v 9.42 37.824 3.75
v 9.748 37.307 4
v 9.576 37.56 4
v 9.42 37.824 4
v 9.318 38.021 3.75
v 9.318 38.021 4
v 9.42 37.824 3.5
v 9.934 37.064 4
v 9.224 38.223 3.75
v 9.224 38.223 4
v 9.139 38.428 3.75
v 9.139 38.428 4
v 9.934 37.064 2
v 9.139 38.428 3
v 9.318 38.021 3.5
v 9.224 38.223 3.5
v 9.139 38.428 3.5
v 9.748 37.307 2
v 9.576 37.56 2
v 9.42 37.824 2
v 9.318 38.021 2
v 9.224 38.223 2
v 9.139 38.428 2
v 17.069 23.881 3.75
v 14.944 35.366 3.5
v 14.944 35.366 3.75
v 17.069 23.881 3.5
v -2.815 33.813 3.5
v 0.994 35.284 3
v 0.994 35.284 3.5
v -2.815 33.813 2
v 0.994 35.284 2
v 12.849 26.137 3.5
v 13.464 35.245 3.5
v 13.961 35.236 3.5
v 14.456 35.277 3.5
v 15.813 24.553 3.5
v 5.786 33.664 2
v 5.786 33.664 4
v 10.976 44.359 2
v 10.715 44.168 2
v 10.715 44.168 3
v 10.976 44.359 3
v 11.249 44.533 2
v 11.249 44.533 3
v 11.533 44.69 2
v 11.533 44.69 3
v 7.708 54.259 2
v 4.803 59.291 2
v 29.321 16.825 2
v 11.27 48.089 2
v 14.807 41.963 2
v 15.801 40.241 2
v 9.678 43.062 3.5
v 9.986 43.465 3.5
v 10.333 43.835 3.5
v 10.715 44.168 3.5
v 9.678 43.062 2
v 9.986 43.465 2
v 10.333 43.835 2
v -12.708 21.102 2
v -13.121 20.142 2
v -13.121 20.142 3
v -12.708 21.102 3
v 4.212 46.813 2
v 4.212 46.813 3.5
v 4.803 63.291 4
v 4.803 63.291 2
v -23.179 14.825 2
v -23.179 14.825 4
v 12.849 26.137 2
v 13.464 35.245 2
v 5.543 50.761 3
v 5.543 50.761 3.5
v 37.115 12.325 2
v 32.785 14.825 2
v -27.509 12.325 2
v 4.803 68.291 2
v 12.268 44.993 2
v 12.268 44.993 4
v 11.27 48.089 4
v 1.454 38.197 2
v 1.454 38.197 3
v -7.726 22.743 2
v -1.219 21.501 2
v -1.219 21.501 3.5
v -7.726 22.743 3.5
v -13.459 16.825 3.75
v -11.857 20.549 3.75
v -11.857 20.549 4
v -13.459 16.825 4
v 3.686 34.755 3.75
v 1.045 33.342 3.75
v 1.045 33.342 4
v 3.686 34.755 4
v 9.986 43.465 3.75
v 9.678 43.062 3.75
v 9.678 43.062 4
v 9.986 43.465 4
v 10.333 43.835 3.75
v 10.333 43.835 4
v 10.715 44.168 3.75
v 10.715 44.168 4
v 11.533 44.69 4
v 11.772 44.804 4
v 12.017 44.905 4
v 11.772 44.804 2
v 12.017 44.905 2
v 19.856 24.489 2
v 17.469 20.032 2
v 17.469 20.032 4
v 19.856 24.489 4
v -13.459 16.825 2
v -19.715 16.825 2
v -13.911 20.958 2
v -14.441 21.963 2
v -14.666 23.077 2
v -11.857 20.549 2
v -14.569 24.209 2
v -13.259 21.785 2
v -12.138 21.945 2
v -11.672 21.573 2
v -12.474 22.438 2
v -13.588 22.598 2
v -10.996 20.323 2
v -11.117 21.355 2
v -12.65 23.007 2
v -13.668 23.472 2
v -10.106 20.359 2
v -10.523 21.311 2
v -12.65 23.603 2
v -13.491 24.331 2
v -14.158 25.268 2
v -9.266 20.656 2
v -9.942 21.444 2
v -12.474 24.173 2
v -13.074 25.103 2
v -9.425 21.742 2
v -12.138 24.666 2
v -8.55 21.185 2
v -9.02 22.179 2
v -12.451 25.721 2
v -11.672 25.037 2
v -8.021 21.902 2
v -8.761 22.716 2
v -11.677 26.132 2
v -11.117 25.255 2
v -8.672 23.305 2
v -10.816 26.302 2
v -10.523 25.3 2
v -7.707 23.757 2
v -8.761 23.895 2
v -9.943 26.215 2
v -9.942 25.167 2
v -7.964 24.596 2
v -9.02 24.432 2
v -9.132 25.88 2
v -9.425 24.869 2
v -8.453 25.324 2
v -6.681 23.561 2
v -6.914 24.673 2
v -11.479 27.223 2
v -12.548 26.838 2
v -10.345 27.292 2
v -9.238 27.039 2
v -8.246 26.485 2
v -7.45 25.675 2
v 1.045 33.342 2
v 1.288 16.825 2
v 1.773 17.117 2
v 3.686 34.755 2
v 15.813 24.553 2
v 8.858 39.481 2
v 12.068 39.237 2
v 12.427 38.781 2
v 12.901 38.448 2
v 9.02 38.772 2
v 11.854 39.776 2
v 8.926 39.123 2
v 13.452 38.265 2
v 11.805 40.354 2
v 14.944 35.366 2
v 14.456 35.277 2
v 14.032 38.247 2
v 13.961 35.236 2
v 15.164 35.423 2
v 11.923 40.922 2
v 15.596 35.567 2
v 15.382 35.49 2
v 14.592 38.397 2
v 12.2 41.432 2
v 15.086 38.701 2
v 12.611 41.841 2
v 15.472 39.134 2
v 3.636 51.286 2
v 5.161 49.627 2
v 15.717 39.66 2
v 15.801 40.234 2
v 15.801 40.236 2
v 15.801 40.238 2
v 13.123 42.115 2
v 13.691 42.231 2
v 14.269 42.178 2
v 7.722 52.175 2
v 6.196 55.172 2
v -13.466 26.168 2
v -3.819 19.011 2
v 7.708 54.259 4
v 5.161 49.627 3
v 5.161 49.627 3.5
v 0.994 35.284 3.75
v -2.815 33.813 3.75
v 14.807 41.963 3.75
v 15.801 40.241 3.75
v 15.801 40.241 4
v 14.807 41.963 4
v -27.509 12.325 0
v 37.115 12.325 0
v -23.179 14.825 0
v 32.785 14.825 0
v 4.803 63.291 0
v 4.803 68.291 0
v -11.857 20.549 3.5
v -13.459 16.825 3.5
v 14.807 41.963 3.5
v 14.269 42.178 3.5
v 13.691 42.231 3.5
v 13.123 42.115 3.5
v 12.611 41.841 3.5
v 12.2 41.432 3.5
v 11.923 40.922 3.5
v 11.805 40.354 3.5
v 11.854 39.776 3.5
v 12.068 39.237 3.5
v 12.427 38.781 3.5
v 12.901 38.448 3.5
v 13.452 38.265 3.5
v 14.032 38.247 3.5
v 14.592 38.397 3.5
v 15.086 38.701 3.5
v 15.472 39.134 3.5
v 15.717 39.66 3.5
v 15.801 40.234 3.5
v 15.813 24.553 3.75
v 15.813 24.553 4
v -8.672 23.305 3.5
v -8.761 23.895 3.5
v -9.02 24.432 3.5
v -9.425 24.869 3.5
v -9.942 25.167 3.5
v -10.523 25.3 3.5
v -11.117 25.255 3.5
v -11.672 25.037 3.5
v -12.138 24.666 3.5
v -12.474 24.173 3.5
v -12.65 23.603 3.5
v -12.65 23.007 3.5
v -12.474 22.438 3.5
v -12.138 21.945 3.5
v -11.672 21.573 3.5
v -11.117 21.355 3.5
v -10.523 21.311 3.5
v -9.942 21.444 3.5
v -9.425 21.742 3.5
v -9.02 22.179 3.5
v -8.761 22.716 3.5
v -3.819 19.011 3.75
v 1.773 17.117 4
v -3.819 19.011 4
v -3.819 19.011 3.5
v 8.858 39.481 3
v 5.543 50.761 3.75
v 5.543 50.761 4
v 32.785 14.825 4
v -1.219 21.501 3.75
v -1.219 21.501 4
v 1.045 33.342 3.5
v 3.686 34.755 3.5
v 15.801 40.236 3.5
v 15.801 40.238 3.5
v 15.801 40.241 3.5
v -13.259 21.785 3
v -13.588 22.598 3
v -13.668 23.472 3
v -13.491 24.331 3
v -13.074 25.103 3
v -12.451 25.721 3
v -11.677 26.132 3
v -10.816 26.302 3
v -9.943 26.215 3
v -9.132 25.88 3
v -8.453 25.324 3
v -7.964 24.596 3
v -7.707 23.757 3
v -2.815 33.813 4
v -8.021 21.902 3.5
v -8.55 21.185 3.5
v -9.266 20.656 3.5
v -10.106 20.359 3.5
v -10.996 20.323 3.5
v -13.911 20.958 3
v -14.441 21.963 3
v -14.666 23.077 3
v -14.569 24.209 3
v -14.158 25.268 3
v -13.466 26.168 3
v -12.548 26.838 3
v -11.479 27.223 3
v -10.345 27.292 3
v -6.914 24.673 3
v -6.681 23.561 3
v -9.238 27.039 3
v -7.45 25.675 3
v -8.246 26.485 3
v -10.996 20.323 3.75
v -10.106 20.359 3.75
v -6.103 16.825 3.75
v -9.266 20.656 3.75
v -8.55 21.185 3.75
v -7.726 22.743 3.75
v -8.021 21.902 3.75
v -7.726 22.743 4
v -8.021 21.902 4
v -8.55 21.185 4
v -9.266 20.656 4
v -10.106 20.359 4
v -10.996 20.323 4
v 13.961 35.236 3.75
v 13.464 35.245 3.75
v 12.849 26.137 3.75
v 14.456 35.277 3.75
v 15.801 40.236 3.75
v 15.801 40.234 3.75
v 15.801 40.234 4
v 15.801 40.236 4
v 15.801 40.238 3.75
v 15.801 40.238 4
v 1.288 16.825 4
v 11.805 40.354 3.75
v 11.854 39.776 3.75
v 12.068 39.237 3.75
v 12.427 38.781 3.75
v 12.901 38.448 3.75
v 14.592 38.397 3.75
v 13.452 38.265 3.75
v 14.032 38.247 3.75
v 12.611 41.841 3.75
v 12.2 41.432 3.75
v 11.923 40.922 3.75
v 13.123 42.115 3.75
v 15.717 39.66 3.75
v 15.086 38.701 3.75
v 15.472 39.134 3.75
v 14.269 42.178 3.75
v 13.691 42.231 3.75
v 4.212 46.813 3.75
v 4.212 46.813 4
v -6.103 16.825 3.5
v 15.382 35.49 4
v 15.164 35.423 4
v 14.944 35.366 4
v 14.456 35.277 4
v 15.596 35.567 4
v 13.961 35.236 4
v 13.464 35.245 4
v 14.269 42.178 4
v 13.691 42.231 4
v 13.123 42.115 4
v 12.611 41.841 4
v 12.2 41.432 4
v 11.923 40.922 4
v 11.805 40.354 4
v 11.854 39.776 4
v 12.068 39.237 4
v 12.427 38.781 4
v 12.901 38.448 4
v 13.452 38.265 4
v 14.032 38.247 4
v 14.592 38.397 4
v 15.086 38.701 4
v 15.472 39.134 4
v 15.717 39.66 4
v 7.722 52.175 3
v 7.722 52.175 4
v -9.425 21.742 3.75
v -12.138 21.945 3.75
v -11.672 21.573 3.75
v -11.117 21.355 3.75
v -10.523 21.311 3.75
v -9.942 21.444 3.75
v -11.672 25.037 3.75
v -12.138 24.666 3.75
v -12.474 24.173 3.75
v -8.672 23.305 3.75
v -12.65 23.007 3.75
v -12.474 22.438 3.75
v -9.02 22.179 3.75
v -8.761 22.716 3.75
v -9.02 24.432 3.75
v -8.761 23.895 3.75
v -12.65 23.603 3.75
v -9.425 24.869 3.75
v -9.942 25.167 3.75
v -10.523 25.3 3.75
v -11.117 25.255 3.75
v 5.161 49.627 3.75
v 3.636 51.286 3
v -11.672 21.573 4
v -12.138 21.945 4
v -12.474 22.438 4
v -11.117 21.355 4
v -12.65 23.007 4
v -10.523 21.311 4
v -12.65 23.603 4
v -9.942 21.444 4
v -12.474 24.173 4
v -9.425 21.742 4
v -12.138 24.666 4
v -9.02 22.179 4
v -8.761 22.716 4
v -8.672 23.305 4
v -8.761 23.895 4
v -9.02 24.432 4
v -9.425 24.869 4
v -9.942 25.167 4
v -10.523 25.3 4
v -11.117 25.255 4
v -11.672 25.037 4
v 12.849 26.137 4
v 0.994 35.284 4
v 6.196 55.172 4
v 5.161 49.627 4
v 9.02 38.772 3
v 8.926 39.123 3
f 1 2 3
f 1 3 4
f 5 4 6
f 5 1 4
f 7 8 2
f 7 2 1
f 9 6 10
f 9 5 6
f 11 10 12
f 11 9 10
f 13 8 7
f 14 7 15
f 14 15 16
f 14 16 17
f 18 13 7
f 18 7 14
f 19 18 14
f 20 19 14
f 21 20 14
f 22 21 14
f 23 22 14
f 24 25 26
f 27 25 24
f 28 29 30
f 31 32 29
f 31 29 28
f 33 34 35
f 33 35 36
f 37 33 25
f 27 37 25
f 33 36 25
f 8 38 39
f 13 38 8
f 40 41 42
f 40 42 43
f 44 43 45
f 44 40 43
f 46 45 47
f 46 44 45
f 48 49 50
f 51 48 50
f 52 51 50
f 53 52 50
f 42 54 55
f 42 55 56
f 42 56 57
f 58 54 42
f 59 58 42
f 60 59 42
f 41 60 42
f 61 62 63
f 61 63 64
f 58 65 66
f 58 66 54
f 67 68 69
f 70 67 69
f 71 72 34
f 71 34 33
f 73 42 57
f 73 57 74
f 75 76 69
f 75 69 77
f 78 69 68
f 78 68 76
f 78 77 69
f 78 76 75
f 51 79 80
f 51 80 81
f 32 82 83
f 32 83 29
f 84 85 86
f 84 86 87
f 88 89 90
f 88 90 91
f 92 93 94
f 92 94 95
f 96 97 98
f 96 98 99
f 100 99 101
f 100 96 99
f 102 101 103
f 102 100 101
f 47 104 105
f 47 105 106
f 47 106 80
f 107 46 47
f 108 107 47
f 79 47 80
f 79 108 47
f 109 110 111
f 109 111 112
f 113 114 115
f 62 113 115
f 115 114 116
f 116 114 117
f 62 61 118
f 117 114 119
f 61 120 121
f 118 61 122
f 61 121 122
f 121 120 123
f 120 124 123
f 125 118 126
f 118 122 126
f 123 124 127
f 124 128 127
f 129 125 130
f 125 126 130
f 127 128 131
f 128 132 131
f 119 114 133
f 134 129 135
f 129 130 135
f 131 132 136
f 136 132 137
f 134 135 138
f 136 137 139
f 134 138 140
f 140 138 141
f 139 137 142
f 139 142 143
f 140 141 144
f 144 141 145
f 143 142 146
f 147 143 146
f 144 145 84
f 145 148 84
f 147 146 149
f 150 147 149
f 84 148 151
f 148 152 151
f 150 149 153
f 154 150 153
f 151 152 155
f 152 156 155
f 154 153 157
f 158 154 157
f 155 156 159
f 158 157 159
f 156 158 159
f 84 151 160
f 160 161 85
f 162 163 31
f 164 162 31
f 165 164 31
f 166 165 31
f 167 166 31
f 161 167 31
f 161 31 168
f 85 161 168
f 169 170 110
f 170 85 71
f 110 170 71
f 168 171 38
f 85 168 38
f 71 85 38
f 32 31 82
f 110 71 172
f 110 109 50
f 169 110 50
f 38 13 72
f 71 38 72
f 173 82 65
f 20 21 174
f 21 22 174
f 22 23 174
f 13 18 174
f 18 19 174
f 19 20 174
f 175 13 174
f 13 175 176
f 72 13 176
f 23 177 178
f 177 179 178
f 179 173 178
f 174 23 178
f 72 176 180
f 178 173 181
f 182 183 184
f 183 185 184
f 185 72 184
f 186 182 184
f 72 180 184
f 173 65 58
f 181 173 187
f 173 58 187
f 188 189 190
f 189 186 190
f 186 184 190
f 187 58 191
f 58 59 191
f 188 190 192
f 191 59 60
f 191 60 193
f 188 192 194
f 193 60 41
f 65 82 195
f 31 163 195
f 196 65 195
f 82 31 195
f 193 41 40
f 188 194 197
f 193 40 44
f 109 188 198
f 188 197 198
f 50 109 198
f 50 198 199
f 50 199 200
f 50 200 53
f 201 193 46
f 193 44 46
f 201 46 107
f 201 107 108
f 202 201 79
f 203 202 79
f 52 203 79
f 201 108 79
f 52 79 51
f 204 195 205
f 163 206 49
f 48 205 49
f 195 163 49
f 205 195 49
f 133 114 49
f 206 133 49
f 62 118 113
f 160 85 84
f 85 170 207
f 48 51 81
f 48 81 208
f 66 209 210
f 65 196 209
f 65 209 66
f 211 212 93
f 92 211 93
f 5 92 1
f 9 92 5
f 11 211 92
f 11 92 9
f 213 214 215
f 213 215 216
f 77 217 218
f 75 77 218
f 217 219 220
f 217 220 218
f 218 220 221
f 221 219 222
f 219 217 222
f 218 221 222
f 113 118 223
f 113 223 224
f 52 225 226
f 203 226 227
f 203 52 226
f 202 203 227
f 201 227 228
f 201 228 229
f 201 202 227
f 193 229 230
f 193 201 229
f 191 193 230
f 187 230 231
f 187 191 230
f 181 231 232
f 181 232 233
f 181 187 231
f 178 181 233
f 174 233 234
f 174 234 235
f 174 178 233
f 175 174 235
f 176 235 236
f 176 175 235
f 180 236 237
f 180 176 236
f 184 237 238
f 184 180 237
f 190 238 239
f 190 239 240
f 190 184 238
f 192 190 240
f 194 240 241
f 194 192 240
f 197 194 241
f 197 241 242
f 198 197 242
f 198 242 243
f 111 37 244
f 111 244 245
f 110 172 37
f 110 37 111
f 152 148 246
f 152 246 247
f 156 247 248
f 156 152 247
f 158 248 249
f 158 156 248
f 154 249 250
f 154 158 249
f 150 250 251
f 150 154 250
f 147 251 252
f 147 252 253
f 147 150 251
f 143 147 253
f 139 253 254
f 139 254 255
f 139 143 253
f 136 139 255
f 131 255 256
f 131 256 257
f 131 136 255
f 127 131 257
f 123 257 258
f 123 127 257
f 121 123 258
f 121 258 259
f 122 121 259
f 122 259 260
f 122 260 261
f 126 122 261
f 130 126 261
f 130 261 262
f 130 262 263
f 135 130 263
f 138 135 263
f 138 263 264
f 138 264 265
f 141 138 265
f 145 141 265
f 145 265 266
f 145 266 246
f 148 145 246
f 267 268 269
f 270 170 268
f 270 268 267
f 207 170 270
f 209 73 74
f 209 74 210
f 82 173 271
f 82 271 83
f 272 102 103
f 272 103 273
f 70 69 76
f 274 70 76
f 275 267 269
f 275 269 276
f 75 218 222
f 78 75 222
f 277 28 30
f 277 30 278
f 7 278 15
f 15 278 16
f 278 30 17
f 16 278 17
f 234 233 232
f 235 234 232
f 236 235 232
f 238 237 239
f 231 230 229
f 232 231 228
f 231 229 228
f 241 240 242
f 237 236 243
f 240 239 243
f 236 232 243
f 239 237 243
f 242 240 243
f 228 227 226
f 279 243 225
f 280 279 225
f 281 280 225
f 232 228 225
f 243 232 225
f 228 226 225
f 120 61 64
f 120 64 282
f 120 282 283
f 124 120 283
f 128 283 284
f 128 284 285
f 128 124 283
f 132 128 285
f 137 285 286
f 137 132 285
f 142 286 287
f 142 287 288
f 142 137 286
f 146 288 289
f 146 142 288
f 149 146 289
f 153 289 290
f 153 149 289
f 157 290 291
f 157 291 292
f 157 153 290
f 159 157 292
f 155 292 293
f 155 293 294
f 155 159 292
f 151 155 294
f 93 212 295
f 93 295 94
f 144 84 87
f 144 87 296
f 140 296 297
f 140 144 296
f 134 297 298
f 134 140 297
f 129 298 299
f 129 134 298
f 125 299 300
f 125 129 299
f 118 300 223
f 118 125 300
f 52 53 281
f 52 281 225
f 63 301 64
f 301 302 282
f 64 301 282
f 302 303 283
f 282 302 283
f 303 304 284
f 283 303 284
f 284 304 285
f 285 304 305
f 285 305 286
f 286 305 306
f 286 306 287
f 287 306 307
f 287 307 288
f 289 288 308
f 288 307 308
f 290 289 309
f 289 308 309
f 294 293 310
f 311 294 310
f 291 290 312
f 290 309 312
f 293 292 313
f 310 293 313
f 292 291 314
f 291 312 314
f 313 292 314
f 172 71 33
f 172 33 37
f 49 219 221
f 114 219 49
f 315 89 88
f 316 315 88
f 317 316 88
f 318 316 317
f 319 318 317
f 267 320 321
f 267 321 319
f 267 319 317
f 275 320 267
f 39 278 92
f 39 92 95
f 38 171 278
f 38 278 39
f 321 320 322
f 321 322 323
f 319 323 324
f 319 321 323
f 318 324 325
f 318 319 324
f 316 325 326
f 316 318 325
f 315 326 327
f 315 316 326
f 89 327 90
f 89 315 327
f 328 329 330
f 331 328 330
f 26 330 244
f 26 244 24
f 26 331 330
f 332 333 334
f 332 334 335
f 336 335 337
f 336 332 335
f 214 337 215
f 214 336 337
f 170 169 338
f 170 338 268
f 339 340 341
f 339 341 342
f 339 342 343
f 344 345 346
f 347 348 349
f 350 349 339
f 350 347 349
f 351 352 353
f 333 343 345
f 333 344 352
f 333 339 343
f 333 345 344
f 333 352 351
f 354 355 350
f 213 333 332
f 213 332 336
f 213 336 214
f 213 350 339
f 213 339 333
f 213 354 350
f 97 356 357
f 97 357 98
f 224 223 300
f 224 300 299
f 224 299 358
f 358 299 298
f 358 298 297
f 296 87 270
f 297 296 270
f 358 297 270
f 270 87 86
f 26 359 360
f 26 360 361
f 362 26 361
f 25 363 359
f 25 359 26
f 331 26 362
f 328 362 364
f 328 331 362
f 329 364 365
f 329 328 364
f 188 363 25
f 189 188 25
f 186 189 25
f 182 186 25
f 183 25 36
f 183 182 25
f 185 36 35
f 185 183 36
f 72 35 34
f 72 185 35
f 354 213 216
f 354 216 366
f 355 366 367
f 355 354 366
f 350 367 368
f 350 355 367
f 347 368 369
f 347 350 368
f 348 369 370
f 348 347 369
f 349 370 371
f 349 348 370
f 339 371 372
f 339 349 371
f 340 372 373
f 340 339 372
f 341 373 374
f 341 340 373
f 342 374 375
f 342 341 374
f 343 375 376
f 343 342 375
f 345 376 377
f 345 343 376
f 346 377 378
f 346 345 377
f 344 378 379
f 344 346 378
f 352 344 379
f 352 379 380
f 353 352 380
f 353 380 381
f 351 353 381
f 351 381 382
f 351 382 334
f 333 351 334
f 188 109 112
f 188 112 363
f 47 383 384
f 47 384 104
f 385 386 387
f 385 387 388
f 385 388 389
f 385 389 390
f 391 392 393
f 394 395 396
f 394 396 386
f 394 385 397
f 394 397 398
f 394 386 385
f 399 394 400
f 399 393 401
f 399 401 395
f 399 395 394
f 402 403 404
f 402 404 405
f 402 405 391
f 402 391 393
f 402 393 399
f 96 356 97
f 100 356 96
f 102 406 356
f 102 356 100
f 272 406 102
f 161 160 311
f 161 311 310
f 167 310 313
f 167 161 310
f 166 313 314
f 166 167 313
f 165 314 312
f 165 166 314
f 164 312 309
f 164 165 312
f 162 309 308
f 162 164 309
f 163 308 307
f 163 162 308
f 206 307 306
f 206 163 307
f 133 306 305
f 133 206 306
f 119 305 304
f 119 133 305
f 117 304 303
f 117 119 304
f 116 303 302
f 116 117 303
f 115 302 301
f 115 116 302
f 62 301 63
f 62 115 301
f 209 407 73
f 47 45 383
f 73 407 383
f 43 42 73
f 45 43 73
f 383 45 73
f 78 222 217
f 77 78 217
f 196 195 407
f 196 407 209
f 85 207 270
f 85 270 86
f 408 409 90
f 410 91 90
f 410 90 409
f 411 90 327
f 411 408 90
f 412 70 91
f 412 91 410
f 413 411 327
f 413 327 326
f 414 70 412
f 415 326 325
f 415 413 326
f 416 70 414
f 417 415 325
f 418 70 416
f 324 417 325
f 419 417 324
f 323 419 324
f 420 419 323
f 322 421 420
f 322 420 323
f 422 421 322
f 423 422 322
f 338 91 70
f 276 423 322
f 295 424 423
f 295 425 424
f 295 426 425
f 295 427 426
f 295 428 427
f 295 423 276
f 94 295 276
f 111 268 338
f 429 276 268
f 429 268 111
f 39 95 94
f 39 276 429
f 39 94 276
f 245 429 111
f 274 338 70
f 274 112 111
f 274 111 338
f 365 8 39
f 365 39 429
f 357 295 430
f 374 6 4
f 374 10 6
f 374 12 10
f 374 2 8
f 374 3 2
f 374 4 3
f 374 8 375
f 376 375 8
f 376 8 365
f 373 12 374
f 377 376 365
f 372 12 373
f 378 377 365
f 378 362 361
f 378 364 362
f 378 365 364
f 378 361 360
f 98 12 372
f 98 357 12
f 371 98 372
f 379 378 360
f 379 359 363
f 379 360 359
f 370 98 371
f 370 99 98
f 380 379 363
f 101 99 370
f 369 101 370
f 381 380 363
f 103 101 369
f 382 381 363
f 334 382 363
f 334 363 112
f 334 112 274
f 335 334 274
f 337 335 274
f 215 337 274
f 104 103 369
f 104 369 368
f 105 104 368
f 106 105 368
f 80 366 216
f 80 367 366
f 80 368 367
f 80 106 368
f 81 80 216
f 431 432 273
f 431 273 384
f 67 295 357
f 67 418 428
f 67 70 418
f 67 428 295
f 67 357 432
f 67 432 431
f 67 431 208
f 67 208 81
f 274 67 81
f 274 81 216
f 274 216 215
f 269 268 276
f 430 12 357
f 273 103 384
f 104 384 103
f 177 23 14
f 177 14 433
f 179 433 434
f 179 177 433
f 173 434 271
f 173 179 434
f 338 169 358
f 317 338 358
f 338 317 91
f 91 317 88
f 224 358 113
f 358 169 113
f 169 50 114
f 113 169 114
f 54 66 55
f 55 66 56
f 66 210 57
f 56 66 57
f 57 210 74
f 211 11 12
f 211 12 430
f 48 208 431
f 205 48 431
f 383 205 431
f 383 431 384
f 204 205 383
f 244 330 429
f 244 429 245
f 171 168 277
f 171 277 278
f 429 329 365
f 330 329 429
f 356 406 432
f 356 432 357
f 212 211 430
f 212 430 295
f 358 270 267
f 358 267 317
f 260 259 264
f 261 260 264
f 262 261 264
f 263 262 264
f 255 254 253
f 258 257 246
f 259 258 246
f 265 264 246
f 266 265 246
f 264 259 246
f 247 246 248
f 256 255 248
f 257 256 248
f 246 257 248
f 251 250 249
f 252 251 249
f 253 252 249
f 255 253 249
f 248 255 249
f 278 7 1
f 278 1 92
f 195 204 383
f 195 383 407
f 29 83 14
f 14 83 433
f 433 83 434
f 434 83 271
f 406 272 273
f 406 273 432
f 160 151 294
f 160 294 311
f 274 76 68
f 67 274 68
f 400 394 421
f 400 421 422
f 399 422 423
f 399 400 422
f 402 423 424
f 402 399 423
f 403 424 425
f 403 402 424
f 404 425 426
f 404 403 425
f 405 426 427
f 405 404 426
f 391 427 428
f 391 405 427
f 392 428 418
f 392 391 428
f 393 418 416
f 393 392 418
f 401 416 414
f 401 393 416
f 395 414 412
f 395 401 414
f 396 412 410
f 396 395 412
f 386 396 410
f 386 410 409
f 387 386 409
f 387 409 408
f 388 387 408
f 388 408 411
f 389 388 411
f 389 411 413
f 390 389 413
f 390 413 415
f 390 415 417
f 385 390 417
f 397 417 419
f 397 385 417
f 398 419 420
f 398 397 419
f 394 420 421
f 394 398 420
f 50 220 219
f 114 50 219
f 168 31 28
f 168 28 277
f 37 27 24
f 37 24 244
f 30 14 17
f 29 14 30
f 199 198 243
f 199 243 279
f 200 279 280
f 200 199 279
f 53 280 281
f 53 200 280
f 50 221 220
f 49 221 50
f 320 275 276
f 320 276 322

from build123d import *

# Parameters (mm, degrees)
F1_DEPTH  = 4
F2_DEPTH  = 2
F3_START  = 2
F3_DEPTH  = 2
F4_SIZE   = 1.99999
F6_START  = 3.75
F5_R      = 2
F6_DEPTH  = 0.25
F7_DEPTH  = 3.5
F8_DEPTH  = 3.5
F9_DEPTH  = 3
F10_DEPTH = 3.25
F11_DEPTH = 3


# Not quite as in the source:
# - a fillet or chamfer is up to 0.001 mm smaller than in the source, because OpenCascade refuses the exact size


with BuildPart() as f1:
    # F0 (on Top) → F1 (new body)
    with BuildSketch(Plane.XY):
        Polygon((32.7846783229, 14.824549064), (4.8026783229, 63.2907947614), (-23.1793216771, 14.824549064), align=None)
        Polygon((-19.715220062, 16.824549064), (4.8026783229, 59.2907947614), (29.3205767077, 16.824549064), align=None, mode=Mode.SUBTRACT)
    extrude(amount=F1_DEPTH)

    # F0 (on Top) → F2 (join)
    with BuildSketch(Plane.XY):
        Polygon((37.1148053418, 12.324549064), (4.8026783229, 68.2907947614), (-27.509448696, 12.324549064), align=None)
        Polygon((-23.1793216771, 14.824549064), (4.8026783229, 63.2907947614), (32.7846783229, 14.824549064), align=None, mode=Mode.SUBTRACT)
    extrude(amount=F2_DEPTH)

    # F0 (on Top) → F3 (join)
    with BuildSketch(Plane.XY.offset(F3_START)):
        Polygon((29.3205767077, 16.824549064), (4.8026783229, 59.2907947614), (-19.715220062, 16.824549064), align=None)
    extrude(amount=F3_DEPTH)

    # F4 (size 2 in the source; OpenCascade refuses exactly that, so slightly less here)
    f4_edges = [f1.edges().sort_by_distance(p)[0] for p in [
        (4.802678, 16.824549, 0),
        (-7.456271, 38.057672, 0),
        (17.061628, 38.057672, 0),
    ]]
    chamfer(f4_edges, length=F4_SIZE)

    # F5 (on face) → F6 (cut)
    with BuildSketch(Plane.XY.offset(F6_START)):
        with BuildLine():
            Line((15.8012454512, 40.2407176847), (14.8071694273, 41.9625078646))
            ThreePointArc((14.8071694273, 41.9625078646), (12.0675004242, 39.2368445398), (15.801257126, 40.2338840067))
            ThreePointArc((15.801257126, 40.2338840067), (15.8012542073, 40.2373008507), (15.8012454512, 40.2407176847))
        make_face()
        with BuildLine():
            Line((17.0693753854, 23.8813530259), (14.9441122519, 35.3662478082))
            ThreePointArc((14.9441122519, 35.3662478082), (14.2087911946, 35.2505200844), (13.4644377158, 35.2452416378))
            Line((13.4644377158, 35.2452416378), (12.8494622186, 26.1368211359))
            Line((12.8494622186, 26.1368211359), (15.8132929355, 24.552706629))
            Line((15.8132929355, 24.552706629), (17.0693753854, 23.8813530259))
        make_face()
        with BuildLine():
            ThreePointArc((9.6781818277, 43.0623553402), (10.154568974, 43.6546537332), (10.7152328484, 44.1678964823))
            Line((10.7152328484, 44.1678964823), (5.5434275419, 50.7608279586))
            Line((5.5434275419, 50.7608279586), (5.1609951292, 49.6271412781))
            Line((5.1609951292, 49.6271412781), (4.2115291581, 46.8125343323))
            Line((4.2115291581, 46.8125343323), (9.6781818277, 43.0623553402))
        make_face()
        with BuildLine():
            Line((-13.4587365793, 16.824549064), (-6.1025659626, 16.824549064))
            Line((-6.1025659626, 16.824549064), (-3.819498702, 19.0105444595))
            Line((-3.819498702, 19.0105444595), (-1.2189327972, 21.5005390346))
            Line((-1.2189327972, 21.5005390346), (-7.725601985, 22.742720621))
            ThreePointArc((-7.725601985, 22.742720621), (-9.2656609828, 20.6555454959), (-11.8573356204, 20.5492238495))
            Line((-11.8573356204, 20.5492238495), (-13.4587365793, 16.824549064))
        make_face()
        with BuildLine():
            Line((3.6860700174, 34.755180139), (9.4204377363, 37.8238173116))
            ThreePointArc((9.4204377363, 37.8238173116), (9.2694965624, 38.1212680469), (9.1387235678, 38.4281207834))
            Line((9.1387235678, 38.4281207834), (0.9941436583, 35.2838113904))
            Line((0.9941436583, 35.2838113904), (-2.8154677711, 33.8130667806))
            Line((-2.8154677711, 33.8130667806), (1.0452440474, 33.3419926465))
            Line((1.0452440474, 33.3419926465), (3.6860700174, 34.755180139))
        make_face()
        with Locations((-10.6723830104, 23.3052875847)):
            Circle(F5_R)
    extrude(amount=F6_DEPTH, mode=Mode.SUBTRACT)

    # F5 (on face) → F7 (cut)
    with BuildSketch(Plane.XY):
        with BuildLine():
            Line((15.8012454512, 40.2407176847), (14.8071694273, 41.9625078646))
            ThreePointArc((14.8071694273, 41.9625078646), (12.0675004242, 39.2368445398), (15.801257126, 40.2338840067))
            ThreePointArc((15.801257126, 40.2338840067), (15.8012542073, 40.2373008507), (15.8012454512, 40.2407176847))
        make_face()
        with Locations((-10.6723830104, 23.3052875847)):
            Circle(F5_R)
    extrude(amount=F7_DEPTH, mode=Mode.SUBTRACT)

    # F5 (on face) → F8 (cut)
    with BuildSketch(Plane.XY):
        with BuildLine():
            Line((3.6860700174, 34.755180139), (9.4204377363, 37.8238173116))
            ThreePointArc((9.4204377363, 37.8238173116), (9.2694965624, 38.1212680469), (9.1387235678, 38.4281207834))
            Line((9.1387235678, 38.4281207834), (0.9941436583, 35.2838113904))
            Line((0.9941436583, 35.2838113904), (-2.8154677711, 33.8130667806))
            Line((-2.8154677711, 33.8130667806), (1.0452440474, 33.3419926465))
            Line((1.0452440474, 33.3419926465), (3.6860700174, 34.755180139))
        make_face()
        with BuildLine():
            Line((17.0693753854, 23.8813530259), (14.9441122519, 35.3662478082))
            ThreePointArc((14.9441122519, 35.3662478082), (14.2087911946, 35.2505200844), (13.4644377158, 35.2452416378))
            Line((13.4644377158, 35.2452416378), (12.8494622186, 26.1368211359))
            Line((12.8494622186, 26.1368211359), (15.8132929355, 24.552706629))
            Line((15.8132929355, 24.552706629), (17.0693753854, 23.8813530259))
        make_face()
        with BuildLine():
            Line((-13.4587365793, 16.824549064), (-6.1025659626, 16.824549064))
            Line((-6.1025659626, 16.824549064), (-3.819498702, 19.0105444595))
            Line((-3.819498702, 19.0105444595), (-1.2189327972, 21.5005390346))
            Line((-1.2189327972, 21.5005390346), (-7.725601985, 22.742720621))
            ThreePointArc((-7.725601985, 22.742720621), (-9.2656609828, 20.6555454959), (-11.8573356204, 20.5492238495))
            Line((-11.8573356204, 20.5492238495), (-13.4587365793, 16.824549064))
        make_face()
        with BuildLine():
            ThreePointArc((9.6781818277, 43.0623553402), (10.154568974, 43.6546537332), (10.7152328484, 44.1678964823))
            Line((10.7152328484, 44.1678964823), (5.5434275419, 50.7608279586))
            Line((5.5434275419, 50.7608279586), (5.1609951292, 49.6271412781))
            Line((5.1609951292, 49.6271412781), (4.2115291581, 46.8125343323))
            Line((4.2115291581, 46.8125343323), (9.6781818277, 43.0623553402))
        make_face()
    extrude(amount=F8_DEPTH, mode=Mode.SUBTRACT)

    # F5 (on face) → F9 (cut)
    with BuildSketch(Plane.XY):
        with BuildLine():
            Line((19.8564007878, 24.4885329157), (15.5959561349, 35.5670804467))
            ThreePointArc((15.5959561349, 35.5670804467), (15.2734627879, 35.4555359146), (14.9441122519, 35.3662478082))
            Line((14.9441122519, 35.3662478082), (17.0693753854, 23.8813530259))
            Line((17.0693753854, 23.8813530259), (15.8132929355, 24.552706629))
            Line((15.8132929355, 24.552706629), (17.4690298736, 20.0315453112))
            Line((17.4690298736, 20.0315453112), (19.8564007878, 24.4885329157))
        make_face()
        Polygon((-6.1025659626, 16.824549064), (1.2875116271, 16.824549064), (1.7734020948, 17.1169545501), (-3.819498702, 19.0105444595), align=None)
        with BuildLine():
            Line((5.785849411, 33.66388008), (9.9342960343, 37.064244924))
            ThreePointArc((9.9342960343, 37.064244924), (9.6599157648, 37.4322252607), (9.4204377363, 37.8238173116))
            Line((9.4204377363, 37.8238173116), (3.6860700174, 34.755180139))
            Line((3.6860700174, 34.755180139), (5.785849411, 33.66388008))
        make_face()
        with BuildLine():
            ThreePointArc((11.5326481984, 44.6896009562), (11.8941525727, 44.8558913869), (12.2677356256, 44.9929082563))
            Line((12.2677356256, 44.9929082563), (11.2701070238, 48.0888796571))
            Line((11.2701070238, 48.0888796571), (7.7075759005, 54.2593645662))
            Line((7.7075759005, 54.2593645662), (6.1958078295, 55.1715530455))
            Line((6.1958078295, 55.1715530455), (7.7216781624, 52.1746300315))
            Line((7.7216781624, 52.1746300315), (11.5326481984, 44.6896009562))
        make_face()
        with BuildLine():
            ThreePointArc((-12.7082549566, 21.1018299793), (-12.079105038, 25.9550296735), (-7.7066088949, 23.7571547066))
            Line((-7.7066088949, 23.7571547066), (-6.6805827438, 23.5612770993))
            ThreePointArc((-6.6805827438, 23.5612770993), (-12.5480123805, 26.8382770364), (-13.1208381636, 20.1422088056))
            Line((-13.1208381636, 20.1422088056), (-12.7082549566, 21.1018299793))
        make_face()
    extrude(amount=F9_DEPTH, mode=Mode.SUBTRACT)

    # F10 (cut): faces of the model
    f10_faces = [f1.faces().sort_by_distance(p)[0] for p in [
        (9.5592668565, 49.7626778986, 3),
        (6.8730240158, 35.6258562625, 3),
        (-2.519612135, 17.5665266523, 3),
        (17.3422888297, 27.0693911728, 3),
    ]]
    extrude(f10_faces, amount=-F10_DEPTH, mode=Mode.SUBTRACT)

    # F5 (on face) → F11 (cut)
    with BuildSketch(Plane.XY):
        with BuildLine():
            ThreePointArc((9.1387235678, 38.4281207834), (8.9697402045, 38.9468547775), (8.8582790135, 39.4809116441))
            Line((8.8582790135, 39.4809116441), (1.4540485572, 38.196541369))
            Line((1.4540485572, 38.196541369), (0.9941436583, 35.2838113904))
            Line((0.9941436583, 35.2838113904), (9.1387235678, 38.4281207834))
        make_face()
        with BuildLine():
            ThreePointArc((10.7152328484, 44.1678964823), (11.1112630591, 44.4486119837), (11.5326481984, 44.6896009562))
            Line((11.5326481984, 44.6896009562), (7.7216781624, 52.1746300315))
            Line((7.7216781624, 52.1746300315), (3.6355266348, 51.2855537236))
            Line((3.6355266348, 51.2855537236), (5.1609951292, 49.6271412781))
            Line((5.1609951292, 49.6271412781), (5.5434275419, 50.7608279586))
            Line((5.5434275419, 50.7608279586), (10.7152328484, 44.1678964823))
        make_face()
    extrude(amount=F11_DEPTH, mode=Mode.SUBTRACT)


solid = f1.part
